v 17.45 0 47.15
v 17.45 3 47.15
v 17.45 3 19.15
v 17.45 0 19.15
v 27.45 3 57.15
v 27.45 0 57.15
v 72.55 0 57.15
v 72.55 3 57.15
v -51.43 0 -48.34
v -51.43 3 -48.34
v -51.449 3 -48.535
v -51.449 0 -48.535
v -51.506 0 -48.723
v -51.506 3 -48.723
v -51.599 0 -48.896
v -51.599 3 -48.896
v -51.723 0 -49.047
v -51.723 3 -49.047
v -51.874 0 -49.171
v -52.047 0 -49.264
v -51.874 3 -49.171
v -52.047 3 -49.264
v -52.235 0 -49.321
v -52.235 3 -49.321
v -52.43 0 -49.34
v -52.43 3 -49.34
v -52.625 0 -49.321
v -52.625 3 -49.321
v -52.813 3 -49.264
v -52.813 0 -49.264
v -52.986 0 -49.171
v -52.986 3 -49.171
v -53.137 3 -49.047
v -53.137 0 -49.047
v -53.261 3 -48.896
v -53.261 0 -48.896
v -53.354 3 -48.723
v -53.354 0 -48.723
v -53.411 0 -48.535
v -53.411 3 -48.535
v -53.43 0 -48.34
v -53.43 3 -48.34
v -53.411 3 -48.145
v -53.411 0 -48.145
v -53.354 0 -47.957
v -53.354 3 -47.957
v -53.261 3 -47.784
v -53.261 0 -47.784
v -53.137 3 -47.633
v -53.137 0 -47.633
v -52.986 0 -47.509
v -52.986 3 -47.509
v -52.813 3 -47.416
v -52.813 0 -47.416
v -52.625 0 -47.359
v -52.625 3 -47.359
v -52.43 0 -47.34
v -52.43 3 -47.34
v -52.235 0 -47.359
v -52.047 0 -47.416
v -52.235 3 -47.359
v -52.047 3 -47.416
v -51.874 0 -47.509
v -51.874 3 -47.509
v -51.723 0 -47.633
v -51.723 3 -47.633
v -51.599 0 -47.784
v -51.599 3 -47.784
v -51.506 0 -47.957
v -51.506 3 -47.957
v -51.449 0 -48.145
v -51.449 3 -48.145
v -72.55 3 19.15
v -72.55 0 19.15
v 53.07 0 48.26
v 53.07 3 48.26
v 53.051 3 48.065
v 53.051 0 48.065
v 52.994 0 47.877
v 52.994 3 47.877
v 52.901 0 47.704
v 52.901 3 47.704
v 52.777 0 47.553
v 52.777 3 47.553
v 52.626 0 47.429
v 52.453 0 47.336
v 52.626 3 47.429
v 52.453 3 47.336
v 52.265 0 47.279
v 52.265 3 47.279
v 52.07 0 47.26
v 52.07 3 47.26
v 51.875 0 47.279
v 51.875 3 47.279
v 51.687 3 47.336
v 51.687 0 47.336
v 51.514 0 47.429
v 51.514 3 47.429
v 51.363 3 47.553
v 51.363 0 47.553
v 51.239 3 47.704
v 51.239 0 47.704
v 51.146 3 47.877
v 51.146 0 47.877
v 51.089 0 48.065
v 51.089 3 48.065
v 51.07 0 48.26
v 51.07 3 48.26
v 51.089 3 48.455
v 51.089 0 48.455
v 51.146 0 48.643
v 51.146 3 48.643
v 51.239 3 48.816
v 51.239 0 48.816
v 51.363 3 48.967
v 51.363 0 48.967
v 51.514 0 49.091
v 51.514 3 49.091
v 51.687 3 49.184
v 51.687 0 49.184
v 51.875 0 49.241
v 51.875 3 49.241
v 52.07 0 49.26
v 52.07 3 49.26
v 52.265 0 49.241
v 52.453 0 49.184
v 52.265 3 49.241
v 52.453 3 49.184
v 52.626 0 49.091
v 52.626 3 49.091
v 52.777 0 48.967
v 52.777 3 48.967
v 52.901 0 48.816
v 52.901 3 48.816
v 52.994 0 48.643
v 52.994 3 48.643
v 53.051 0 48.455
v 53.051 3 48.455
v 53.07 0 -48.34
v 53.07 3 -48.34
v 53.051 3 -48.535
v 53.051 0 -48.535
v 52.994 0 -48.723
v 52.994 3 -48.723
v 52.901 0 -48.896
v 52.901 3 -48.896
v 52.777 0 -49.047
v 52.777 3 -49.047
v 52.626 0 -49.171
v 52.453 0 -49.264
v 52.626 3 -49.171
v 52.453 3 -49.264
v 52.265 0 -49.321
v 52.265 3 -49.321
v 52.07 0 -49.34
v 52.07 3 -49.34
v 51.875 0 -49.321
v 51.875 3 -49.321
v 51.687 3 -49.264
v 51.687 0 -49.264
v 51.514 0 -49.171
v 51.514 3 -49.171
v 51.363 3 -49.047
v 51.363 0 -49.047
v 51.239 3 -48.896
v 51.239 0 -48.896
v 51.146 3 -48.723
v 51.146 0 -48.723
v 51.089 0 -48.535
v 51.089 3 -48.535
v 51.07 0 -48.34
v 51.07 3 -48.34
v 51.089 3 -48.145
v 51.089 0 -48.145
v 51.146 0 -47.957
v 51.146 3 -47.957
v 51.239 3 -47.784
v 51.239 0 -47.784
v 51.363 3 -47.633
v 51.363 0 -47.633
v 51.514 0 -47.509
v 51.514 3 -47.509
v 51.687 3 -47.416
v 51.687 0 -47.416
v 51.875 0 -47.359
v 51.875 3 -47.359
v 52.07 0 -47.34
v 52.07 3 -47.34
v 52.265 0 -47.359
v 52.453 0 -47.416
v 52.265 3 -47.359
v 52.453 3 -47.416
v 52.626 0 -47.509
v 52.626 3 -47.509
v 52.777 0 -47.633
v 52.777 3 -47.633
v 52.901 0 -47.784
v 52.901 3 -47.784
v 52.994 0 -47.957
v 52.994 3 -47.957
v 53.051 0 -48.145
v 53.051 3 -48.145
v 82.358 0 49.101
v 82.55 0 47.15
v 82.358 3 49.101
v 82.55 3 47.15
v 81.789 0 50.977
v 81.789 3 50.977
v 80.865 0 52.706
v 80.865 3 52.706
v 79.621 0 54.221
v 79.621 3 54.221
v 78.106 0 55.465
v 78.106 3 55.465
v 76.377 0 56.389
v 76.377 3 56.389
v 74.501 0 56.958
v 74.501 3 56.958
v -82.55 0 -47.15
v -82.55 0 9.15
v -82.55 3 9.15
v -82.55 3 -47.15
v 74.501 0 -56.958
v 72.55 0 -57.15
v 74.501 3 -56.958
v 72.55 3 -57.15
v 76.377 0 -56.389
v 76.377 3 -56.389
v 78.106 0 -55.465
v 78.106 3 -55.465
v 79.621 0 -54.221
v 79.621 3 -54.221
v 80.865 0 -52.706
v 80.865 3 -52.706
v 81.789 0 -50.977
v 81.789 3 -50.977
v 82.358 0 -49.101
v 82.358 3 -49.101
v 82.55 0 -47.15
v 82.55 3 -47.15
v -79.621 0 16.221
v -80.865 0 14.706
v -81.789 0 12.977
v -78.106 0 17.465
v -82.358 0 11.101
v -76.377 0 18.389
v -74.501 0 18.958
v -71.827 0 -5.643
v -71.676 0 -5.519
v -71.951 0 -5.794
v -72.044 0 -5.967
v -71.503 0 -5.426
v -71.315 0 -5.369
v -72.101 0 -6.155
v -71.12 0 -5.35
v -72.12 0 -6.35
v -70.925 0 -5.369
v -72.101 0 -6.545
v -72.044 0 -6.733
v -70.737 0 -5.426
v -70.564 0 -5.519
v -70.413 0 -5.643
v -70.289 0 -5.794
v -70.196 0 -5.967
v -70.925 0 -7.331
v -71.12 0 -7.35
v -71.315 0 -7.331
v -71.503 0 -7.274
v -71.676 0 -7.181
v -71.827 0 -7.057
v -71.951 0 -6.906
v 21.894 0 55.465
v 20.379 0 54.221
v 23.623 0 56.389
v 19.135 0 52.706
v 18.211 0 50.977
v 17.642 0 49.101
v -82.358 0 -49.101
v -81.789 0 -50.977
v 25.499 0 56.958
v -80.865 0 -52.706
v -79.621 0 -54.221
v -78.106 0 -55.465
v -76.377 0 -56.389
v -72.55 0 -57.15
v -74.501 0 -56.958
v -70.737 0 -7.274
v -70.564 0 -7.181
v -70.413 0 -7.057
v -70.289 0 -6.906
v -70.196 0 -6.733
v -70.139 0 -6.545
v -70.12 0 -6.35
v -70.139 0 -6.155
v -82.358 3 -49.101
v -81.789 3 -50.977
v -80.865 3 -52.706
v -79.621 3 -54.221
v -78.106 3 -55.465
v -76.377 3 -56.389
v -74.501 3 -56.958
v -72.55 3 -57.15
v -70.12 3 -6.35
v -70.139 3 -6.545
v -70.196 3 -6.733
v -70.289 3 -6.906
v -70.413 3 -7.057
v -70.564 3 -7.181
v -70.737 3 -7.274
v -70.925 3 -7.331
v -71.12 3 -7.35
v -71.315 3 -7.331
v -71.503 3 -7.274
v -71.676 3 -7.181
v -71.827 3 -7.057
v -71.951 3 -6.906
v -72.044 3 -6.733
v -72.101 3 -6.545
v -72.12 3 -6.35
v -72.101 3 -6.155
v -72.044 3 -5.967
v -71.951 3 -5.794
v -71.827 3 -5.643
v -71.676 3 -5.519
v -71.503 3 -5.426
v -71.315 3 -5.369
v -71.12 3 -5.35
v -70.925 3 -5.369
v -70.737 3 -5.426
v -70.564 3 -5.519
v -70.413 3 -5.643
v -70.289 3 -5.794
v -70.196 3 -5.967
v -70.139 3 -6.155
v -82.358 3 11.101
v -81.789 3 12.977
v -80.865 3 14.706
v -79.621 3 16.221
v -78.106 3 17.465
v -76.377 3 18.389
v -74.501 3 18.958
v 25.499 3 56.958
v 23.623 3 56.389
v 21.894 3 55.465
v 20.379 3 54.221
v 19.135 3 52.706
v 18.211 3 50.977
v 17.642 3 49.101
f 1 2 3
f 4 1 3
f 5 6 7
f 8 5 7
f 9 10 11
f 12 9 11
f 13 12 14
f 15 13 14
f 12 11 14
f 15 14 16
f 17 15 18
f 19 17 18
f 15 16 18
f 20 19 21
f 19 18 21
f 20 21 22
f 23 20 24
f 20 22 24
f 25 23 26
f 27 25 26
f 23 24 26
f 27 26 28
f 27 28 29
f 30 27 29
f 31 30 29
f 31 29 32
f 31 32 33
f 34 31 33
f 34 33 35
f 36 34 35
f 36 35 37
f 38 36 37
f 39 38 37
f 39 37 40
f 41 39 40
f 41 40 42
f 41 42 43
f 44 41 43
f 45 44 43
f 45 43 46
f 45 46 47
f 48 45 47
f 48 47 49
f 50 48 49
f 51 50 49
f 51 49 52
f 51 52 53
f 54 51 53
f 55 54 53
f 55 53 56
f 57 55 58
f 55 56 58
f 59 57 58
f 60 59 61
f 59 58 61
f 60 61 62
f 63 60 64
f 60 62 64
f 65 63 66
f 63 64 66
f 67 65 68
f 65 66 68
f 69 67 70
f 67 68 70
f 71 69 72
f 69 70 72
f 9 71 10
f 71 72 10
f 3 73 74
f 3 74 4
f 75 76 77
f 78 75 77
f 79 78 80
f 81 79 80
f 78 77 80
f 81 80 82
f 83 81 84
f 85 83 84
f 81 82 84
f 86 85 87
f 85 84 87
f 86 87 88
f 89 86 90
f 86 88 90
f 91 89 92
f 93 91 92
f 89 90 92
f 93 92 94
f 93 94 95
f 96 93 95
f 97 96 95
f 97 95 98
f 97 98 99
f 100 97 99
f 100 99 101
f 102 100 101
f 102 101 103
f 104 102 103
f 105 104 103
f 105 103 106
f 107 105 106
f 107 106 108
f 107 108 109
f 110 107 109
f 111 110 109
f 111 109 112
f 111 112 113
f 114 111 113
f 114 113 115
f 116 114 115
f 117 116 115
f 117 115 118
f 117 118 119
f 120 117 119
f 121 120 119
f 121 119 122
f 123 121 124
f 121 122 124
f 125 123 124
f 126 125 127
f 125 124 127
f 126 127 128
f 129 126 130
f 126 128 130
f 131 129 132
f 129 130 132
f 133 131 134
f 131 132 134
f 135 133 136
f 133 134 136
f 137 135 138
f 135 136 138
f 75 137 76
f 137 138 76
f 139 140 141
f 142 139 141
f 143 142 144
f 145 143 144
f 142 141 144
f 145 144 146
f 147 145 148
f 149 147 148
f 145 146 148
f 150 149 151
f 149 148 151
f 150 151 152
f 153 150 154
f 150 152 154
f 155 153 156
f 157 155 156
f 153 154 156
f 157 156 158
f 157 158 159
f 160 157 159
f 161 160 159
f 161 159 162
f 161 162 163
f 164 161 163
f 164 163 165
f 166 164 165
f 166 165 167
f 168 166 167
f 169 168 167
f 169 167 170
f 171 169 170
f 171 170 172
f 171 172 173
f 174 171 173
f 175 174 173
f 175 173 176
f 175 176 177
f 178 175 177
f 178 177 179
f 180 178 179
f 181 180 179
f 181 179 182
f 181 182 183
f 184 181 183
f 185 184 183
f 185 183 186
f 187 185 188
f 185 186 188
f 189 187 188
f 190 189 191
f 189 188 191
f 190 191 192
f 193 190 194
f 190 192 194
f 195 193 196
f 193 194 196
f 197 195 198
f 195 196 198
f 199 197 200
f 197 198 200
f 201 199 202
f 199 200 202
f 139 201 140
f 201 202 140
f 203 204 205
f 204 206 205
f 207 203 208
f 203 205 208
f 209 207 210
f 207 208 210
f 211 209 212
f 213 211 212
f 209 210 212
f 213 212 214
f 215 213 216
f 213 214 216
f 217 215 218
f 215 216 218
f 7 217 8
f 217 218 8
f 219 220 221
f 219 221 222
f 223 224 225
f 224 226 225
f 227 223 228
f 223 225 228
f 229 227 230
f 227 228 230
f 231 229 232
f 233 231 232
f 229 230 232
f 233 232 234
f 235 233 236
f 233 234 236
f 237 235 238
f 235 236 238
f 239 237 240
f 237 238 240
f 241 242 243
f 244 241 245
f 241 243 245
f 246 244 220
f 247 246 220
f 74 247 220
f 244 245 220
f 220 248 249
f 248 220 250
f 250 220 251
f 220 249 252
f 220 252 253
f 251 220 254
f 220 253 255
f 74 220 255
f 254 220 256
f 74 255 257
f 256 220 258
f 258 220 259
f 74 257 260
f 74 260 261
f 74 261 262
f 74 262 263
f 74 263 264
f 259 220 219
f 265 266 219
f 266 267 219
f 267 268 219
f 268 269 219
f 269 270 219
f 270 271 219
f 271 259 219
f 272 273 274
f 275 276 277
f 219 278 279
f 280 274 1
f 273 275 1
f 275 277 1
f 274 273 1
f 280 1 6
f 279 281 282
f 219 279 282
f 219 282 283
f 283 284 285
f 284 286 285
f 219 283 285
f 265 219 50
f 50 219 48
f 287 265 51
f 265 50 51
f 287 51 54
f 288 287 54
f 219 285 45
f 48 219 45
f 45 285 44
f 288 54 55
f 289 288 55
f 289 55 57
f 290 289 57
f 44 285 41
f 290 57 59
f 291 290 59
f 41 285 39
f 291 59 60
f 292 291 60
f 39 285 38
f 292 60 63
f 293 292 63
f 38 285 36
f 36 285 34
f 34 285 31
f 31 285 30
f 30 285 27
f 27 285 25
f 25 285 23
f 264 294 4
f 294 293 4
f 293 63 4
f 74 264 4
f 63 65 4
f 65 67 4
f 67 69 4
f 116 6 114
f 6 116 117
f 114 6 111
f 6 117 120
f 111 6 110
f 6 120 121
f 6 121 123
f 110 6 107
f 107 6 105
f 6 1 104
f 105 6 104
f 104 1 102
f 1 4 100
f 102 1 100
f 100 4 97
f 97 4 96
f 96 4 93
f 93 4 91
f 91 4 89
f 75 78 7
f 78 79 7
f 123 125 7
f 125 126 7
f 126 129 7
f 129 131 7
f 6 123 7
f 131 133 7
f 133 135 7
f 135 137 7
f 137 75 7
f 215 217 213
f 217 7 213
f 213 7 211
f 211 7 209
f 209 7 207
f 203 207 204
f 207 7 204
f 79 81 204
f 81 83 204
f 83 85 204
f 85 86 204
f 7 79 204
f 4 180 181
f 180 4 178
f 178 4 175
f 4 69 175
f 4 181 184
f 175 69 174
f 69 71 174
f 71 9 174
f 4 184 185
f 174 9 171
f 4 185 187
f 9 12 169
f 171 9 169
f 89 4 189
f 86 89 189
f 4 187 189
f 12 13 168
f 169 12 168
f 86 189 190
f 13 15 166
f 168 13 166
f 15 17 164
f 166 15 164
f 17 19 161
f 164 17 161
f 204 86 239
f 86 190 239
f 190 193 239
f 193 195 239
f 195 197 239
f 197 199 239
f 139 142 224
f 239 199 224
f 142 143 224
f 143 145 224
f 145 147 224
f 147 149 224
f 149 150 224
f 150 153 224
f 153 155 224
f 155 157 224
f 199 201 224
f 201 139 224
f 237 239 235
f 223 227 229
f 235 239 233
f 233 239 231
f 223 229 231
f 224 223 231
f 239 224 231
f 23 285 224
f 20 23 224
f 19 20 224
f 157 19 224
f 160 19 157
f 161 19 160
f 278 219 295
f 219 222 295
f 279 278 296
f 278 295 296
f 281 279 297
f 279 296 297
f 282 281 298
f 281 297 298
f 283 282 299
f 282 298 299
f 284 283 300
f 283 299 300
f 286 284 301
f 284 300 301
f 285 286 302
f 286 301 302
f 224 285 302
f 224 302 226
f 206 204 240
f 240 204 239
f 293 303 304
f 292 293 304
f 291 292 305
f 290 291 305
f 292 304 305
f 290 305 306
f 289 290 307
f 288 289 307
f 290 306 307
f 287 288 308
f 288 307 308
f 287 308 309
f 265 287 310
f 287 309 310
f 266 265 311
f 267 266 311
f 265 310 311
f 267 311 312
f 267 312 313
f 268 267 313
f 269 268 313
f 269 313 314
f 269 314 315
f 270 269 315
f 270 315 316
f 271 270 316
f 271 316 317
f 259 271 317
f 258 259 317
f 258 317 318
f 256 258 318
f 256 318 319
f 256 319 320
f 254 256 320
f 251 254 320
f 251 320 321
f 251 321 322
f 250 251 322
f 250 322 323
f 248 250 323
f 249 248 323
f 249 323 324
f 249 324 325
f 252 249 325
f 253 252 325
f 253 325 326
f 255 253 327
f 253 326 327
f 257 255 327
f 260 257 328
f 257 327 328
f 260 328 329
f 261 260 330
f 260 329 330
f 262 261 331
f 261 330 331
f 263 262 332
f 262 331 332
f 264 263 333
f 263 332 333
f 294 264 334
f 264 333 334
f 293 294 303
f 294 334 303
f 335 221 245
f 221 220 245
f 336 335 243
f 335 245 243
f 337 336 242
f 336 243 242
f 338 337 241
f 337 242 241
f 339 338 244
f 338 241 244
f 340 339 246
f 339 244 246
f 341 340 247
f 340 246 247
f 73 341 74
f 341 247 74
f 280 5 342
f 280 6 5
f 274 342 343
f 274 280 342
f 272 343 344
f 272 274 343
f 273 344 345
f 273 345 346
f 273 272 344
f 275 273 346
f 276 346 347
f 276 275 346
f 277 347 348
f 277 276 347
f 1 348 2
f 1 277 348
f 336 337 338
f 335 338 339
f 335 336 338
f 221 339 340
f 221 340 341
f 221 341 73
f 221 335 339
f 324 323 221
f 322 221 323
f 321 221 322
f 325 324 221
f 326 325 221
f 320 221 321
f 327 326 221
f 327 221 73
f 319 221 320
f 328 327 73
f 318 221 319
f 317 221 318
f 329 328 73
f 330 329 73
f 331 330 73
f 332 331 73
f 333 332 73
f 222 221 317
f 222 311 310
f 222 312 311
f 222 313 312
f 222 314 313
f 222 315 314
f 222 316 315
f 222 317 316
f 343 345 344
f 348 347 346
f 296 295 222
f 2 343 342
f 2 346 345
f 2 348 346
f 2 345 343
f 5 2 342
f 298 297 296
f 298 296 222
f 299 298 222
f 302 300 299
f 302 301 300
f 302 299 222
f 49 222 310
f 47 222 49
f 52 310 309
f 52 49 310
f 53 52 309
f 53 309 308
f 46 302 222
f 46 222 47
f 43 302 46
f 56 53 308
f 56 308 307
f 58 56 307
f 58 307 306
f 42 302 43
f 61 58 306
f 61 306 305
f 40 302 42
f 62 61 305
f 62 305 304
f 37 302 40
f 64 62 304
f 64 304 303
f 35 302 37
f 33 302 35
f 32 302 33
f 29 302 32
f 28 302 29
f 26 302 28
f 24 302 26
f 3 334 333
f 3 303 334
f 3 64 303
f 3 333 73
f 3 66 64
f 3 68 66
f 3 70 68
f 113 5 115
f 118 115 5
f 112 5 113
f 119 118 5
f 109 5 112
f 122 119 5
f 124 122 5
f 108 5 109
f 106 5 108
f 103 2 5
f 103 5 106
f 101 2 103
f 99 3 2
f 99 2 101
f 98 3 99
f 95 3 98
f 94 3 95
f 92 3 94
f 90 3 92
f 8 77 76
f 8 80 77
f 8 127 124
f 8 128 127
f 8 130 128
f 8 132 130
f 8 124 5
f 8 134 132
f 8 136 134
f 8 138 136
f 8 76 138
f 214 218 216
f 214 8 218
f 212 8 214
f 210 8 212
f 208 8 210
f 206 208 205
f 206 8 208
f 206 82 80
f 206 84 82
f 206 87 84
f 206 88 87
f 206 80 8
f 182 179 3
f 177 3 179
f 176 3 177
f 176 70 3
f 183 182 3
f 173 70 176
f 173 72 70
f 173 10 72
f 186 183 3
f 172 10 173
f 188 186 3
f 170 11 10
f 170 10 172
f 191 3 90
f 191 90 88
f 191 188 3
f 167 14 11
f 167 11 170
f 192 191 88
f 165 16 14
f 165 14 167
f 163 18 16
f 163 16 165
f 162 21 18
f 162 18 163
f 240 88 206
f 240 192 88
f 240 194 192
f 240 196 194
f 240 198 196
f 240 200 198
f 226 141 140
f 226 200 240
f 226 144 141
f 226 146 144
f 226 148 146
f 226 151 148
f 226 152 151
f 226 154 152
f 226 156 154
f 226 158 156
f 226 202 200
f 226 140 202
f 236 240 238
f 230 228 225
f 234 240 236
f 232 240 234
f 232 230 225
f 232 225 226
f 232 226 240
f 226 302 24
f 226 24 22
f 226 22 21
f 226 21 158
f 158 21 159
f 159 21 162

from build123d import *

# Parameters (mm, degrees)
SKETCH1_W           = 165.1
SKETCH1_H           = 114.3
BOSS_EXTRUDE1_DEPTH = 3
SKETCH2_W           = 100
SKETCH2_H           = 38
CUT_EXTRUDE1_DEPTH  = 4
FILLET2_R           = 10
SKETCH3_R           = 1
CUT_EXTRUDE3_DEPTH  = 4


with BuildPart() as part:
    # Sketch1 → Boss-Extrude1 (new body)
    with BuildSketch(Plane(origin=(0, 0, 0), x_dir=(1, 0, 0), z_dir=(0, 1, 0))):
        Rectangle(SKETCH1_W, SKETCH1_H)
    extrude(amount=BOSS_EXTRUDE1_DEPTH)

    # Sketch2 → Cut-Extrude1 (cut, through all)
    with BuildSketch(Plane(origin=(0, 3, 0), x_dir=(1, 0, 0), z_dir=(0, 1, 0))):
        with Locations((-32.55, -38.15)):
            Rectangle(SKETCH2_W, SKETCH2_H)
    extrude(amount=-CUT_EXTRUDE1_DEPTH, mode=Mode.SUBTRACT)

    # Fillet2
    fillet2_edges = [part.edges().sort_by_distance(p)[0] for p in [
        (-82.55, 1.5, 19.15),
        (17.45, 1.5, 57.15),
        (-82.55, 1.5, -57.15),
        (82.55, 1.5, -57.15),
        (82.55, 1.5, 57.15),
    ]]
    fillet(fillet2_edges, radius=FILLET2_R)

    # Sketch3 → Cut-Extrude3 (cut, through all)
    with BuildSketch(Plane(origin=(0, 3, 0), x_dir=(1, 0, 0), z_dir=(0, 1, 0))):
        with Locations((-52.43, 48.34)):
            Circle(SKETCH3_R)
        with Locations((-71.12, 6.35)):
            Circle(SKETCH3_R)
        with Locations((52.07, 48.34)):
            Circle(SKETCH3_R)
        with Locations((52.07, -48.26)):
            Circle(SKETCH3_R)
    extrude(amount=-CUT_EXTRUDE3_DEPTH, mode=Mode.SUBTRACT)


solid = part.part
